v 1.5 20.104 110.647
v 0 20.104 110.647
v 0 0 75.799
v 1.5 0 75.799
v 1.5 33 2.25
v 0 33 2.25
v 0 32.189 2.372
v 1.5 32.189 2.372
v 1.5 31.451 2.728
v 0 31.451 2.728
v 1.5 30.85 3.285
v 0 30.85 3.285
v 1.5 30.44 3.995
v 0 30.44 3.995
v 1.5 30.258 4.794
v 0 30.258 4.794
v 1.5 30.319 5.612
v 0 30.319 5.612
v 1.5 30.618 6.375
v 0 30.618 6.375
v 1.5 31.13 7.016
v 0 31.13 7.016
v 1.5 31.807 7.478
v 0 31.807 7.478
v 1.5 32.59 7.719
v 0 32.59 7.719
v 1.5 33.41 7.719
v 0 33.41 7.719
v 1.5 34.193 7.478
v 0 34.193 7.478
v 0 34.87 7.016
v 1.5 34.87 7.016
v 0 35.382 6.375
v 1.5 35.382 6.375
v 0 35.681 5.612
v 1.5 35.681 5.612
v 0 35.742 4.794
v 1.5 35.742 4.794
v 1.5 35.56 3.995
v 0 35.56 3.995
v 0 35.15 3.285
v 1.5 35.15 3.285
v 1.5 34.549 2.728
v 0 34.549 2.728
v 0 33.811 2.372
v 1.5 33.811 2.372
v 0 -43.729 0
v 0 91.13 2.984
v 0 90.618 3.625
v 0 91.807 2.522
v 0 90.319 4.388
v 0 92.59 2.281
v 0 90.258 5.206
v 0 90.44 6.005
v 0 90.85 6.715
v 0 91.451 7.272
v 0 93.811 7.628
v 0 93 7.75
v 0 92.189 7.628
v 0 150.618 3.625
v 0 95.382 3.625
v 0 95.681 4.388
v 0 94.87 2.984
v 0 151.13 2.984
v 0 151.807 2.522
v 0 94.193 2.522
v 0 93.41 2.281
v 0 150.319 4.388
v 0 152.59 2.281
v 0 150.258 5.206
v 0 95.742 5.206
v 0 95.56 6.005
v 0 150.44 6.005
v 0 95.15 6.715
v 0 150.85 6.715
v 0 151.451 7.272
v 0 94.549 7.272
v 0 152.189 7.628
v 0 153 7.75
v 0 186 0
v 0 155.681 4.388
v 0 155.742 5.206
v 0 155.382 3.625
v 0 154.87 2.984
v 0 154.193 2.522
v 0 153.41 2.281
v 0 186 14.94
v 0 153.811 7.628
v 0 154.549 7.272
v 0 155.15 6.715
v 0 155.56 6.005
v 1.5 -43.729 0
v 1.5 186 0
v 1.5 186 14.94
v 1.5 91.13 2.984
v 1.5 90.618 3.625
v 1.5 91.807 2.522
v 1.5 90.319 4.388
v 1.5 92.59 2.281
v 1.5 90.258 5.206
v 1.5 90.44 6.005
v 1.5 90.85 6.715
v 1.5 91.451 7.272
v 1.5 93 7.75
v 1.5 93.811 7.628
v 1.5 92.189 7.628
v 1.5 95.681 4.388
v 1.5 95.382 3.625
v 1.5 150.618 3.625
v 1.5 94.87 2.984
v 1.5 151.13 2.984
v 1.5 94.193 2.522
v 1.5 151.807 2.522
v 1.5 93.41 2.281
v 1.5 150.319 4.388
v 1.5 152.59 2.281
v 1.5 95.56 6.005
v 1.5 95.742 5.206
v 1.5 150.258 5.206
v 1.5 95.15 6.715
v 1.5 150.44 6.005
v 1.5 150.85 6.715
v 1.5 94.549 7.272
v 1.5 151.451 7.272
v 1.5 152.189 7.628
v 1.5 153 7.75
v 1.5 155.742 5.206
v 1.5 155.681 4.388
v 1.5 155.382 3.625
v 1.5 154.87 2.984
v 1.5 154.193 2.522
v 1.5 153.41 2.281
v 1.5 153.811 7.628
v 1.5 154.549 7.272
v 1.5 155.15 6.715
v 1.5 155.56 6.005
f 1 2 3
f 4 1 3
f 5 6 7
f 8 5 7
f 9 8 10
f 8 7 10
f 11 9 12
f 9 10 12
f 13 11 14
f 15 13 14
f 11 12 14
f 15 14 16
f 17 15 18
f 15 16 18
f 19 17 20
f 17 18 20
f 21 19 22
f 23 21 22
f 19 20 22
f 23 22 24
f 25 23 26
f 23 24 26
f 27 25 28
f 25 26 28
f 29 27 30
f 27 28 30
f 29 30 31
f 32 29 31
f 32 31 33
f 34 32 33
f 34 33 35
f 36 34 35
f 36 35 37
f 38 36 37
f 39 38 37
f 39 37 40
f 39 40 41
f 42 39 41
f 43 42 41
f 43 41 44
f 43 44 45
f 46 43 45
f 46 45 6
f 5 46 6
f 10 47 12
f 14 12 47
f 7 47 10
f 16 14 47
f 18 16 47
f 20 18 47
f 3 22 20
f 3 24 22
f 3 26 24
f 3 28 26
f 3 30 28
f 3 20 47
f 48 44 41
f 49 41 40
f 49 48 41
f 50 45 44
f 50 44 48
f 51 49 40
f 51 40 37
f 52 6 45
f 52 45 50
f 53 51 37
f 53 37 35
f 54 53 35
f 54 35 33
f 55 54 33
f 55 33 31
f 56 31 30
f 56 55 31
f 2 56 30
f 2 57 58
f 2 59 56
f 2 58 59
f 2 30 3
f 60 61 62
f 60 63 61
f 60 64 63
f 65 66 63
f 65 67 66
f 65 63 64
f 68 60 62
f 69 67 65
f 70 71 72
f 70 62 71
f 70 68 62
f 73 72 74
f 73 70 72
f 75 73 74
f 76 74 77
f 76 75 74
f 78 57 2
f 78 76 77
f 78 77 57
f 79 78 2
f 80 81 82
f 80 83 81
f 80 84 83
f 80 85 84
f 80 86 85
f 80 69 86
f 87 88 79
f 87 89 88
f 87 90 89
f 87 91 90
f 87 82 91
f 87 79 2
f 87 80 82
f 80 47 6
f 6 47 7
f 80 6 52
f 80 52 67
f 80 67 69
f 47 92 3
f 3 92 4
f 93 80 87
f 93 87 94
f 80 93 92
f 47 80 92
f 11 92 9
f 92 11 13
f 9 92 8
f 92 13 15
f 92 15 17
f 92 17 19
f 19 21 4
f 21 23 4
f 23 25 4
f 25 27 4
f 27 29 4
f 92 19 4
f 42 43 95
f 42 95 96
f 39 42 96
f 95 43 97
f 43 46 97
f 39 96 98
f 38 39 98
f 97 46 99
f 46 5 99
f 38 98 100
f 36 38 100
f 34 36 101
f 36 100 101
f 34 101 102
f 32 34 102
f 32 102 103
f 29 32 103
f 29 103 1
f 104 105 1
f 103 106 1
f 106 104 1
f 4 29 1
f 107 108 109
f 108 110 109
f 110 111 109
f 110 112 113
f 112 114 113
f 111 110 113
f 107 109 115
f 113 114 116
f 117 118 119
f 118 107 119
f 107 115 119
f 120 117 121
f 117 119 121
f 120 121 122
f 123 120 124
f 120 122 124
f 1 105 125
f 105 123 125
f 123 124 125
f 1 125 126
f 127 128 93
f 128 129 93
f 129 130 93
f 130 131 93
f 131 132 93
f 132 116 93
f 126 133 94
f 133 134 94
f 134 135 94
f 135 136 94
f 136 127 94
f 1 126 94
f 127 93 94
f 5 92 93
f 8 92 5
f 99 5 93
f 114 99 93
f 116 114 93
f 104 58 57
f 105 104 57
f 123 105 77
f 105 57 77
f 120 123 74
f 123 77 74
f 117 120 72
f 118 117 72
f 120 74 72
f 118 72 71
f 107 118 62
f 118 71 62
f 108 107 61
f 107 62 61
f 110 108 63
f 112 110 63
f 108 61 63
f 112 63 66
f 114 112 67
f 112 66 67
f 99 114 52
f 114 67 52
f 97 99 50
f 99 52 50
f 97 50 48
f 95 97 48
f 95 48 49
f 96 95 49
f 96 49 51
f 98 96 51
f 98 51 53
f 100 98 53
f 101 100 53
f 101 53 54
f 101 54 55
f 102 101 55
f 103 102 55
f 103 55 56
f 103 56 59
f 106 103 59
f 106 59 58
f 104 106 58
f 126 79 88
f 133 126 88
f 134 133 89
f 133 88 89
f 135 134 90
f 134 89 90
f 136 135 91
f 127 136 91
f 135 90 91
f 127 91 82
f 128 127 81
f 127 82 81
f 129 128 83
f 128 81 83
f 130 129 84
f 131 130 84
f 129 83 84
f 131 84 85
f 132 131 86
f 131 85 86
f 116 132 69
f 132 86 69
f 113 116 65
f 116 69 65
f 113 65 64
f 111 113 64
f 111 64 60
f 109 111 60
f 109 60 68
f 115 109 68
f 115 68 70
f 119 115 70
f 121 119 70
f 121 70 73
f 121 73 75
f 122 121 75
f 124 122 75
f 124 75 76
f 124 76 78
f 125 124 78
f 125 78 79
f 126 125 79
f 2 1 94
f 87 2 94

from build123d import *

# Parameters (mm, degrees)
SKETCH_1_W             = 1.5
SKETCH_1_H             = 186
SM_BASE_FLANGE_1_DEPTH = 130
SKETCH_6_R             = 2.75
CUT_EXTRUDE_1_DEPTH    = 227.932258615
CUT_EXTRUDE_2_DEPTH    = 10
CUT_EXTRUDE_4_DEPTH    = 10
EXTRUDE_1_DEPTH        = 1.5


# Sheet-metal steps are written as plain solids
with BuildPart() as part:
    # Sketch 1 → 基体-法兰1 (new body)
    with BuildSketch(Plane.XY):
        with Locations((0.75, 93)):
            Rectangle(SKETCH_1_W, SKETCH_1_H)
    extrude(amount=SM_BASE_FLANGE_1_DEPTH)

    # 草图6 → 切除-拉伸1 (cut, through all)
    with BuildSketch(Plane.ZY):
        with Locations((5, 153)):
            Circle(SKETCH_6_R)
        with Locations((5, 93)):
            Circle(SKETCH_6_R)
        with Locations(Location((5, 33, 0), (0, 0, 180))):
            Circle(SKETCH_6_R)
    extrude(amount=-CUT_EXTRUDE_1_DEPTH, mode=Mode.SUBTRACT)

    # 草图7 → 切除-拉伸2 (cut)
    with BuildSketch(Plane(origin=(1.5, 0, 0), x_dir=(0, 0, -1), z_dir=(1, 0, 0))):
        Polygon((-14.94, 186), (-130, 186), (-130, -13.441807708), align=None)
    extrude(amount=-CUT_EXTRUDE_2_DEPTH, mode=Mode.SUBTRACT)

    # 草图8 → 切除-拉伸4 (cut)
    with BuildSketch(Plane.ZY):
        Polygon((122.245284915, 0), (110.646921999, 20.104280083), (75.798721386, 0), align=None)
    extrude(amount=-CUT_EXTRUDE_4_DEPTH, mode=Mode.SUBTRACT)

    # 草图10 → 凸台-拉伸1 (add)
    with BuildSketch(Plane(origin=(1.5, 0, 0), x_dir=(0, 0, -1), z_dir=(1, 0, 0))):
        Polygon((-75.798721386, 0), (0, 0), (0, -43.729050508), align=None)
    extrude(amount=-EXTRUDE_1_DEPTH)


solid = part.part
